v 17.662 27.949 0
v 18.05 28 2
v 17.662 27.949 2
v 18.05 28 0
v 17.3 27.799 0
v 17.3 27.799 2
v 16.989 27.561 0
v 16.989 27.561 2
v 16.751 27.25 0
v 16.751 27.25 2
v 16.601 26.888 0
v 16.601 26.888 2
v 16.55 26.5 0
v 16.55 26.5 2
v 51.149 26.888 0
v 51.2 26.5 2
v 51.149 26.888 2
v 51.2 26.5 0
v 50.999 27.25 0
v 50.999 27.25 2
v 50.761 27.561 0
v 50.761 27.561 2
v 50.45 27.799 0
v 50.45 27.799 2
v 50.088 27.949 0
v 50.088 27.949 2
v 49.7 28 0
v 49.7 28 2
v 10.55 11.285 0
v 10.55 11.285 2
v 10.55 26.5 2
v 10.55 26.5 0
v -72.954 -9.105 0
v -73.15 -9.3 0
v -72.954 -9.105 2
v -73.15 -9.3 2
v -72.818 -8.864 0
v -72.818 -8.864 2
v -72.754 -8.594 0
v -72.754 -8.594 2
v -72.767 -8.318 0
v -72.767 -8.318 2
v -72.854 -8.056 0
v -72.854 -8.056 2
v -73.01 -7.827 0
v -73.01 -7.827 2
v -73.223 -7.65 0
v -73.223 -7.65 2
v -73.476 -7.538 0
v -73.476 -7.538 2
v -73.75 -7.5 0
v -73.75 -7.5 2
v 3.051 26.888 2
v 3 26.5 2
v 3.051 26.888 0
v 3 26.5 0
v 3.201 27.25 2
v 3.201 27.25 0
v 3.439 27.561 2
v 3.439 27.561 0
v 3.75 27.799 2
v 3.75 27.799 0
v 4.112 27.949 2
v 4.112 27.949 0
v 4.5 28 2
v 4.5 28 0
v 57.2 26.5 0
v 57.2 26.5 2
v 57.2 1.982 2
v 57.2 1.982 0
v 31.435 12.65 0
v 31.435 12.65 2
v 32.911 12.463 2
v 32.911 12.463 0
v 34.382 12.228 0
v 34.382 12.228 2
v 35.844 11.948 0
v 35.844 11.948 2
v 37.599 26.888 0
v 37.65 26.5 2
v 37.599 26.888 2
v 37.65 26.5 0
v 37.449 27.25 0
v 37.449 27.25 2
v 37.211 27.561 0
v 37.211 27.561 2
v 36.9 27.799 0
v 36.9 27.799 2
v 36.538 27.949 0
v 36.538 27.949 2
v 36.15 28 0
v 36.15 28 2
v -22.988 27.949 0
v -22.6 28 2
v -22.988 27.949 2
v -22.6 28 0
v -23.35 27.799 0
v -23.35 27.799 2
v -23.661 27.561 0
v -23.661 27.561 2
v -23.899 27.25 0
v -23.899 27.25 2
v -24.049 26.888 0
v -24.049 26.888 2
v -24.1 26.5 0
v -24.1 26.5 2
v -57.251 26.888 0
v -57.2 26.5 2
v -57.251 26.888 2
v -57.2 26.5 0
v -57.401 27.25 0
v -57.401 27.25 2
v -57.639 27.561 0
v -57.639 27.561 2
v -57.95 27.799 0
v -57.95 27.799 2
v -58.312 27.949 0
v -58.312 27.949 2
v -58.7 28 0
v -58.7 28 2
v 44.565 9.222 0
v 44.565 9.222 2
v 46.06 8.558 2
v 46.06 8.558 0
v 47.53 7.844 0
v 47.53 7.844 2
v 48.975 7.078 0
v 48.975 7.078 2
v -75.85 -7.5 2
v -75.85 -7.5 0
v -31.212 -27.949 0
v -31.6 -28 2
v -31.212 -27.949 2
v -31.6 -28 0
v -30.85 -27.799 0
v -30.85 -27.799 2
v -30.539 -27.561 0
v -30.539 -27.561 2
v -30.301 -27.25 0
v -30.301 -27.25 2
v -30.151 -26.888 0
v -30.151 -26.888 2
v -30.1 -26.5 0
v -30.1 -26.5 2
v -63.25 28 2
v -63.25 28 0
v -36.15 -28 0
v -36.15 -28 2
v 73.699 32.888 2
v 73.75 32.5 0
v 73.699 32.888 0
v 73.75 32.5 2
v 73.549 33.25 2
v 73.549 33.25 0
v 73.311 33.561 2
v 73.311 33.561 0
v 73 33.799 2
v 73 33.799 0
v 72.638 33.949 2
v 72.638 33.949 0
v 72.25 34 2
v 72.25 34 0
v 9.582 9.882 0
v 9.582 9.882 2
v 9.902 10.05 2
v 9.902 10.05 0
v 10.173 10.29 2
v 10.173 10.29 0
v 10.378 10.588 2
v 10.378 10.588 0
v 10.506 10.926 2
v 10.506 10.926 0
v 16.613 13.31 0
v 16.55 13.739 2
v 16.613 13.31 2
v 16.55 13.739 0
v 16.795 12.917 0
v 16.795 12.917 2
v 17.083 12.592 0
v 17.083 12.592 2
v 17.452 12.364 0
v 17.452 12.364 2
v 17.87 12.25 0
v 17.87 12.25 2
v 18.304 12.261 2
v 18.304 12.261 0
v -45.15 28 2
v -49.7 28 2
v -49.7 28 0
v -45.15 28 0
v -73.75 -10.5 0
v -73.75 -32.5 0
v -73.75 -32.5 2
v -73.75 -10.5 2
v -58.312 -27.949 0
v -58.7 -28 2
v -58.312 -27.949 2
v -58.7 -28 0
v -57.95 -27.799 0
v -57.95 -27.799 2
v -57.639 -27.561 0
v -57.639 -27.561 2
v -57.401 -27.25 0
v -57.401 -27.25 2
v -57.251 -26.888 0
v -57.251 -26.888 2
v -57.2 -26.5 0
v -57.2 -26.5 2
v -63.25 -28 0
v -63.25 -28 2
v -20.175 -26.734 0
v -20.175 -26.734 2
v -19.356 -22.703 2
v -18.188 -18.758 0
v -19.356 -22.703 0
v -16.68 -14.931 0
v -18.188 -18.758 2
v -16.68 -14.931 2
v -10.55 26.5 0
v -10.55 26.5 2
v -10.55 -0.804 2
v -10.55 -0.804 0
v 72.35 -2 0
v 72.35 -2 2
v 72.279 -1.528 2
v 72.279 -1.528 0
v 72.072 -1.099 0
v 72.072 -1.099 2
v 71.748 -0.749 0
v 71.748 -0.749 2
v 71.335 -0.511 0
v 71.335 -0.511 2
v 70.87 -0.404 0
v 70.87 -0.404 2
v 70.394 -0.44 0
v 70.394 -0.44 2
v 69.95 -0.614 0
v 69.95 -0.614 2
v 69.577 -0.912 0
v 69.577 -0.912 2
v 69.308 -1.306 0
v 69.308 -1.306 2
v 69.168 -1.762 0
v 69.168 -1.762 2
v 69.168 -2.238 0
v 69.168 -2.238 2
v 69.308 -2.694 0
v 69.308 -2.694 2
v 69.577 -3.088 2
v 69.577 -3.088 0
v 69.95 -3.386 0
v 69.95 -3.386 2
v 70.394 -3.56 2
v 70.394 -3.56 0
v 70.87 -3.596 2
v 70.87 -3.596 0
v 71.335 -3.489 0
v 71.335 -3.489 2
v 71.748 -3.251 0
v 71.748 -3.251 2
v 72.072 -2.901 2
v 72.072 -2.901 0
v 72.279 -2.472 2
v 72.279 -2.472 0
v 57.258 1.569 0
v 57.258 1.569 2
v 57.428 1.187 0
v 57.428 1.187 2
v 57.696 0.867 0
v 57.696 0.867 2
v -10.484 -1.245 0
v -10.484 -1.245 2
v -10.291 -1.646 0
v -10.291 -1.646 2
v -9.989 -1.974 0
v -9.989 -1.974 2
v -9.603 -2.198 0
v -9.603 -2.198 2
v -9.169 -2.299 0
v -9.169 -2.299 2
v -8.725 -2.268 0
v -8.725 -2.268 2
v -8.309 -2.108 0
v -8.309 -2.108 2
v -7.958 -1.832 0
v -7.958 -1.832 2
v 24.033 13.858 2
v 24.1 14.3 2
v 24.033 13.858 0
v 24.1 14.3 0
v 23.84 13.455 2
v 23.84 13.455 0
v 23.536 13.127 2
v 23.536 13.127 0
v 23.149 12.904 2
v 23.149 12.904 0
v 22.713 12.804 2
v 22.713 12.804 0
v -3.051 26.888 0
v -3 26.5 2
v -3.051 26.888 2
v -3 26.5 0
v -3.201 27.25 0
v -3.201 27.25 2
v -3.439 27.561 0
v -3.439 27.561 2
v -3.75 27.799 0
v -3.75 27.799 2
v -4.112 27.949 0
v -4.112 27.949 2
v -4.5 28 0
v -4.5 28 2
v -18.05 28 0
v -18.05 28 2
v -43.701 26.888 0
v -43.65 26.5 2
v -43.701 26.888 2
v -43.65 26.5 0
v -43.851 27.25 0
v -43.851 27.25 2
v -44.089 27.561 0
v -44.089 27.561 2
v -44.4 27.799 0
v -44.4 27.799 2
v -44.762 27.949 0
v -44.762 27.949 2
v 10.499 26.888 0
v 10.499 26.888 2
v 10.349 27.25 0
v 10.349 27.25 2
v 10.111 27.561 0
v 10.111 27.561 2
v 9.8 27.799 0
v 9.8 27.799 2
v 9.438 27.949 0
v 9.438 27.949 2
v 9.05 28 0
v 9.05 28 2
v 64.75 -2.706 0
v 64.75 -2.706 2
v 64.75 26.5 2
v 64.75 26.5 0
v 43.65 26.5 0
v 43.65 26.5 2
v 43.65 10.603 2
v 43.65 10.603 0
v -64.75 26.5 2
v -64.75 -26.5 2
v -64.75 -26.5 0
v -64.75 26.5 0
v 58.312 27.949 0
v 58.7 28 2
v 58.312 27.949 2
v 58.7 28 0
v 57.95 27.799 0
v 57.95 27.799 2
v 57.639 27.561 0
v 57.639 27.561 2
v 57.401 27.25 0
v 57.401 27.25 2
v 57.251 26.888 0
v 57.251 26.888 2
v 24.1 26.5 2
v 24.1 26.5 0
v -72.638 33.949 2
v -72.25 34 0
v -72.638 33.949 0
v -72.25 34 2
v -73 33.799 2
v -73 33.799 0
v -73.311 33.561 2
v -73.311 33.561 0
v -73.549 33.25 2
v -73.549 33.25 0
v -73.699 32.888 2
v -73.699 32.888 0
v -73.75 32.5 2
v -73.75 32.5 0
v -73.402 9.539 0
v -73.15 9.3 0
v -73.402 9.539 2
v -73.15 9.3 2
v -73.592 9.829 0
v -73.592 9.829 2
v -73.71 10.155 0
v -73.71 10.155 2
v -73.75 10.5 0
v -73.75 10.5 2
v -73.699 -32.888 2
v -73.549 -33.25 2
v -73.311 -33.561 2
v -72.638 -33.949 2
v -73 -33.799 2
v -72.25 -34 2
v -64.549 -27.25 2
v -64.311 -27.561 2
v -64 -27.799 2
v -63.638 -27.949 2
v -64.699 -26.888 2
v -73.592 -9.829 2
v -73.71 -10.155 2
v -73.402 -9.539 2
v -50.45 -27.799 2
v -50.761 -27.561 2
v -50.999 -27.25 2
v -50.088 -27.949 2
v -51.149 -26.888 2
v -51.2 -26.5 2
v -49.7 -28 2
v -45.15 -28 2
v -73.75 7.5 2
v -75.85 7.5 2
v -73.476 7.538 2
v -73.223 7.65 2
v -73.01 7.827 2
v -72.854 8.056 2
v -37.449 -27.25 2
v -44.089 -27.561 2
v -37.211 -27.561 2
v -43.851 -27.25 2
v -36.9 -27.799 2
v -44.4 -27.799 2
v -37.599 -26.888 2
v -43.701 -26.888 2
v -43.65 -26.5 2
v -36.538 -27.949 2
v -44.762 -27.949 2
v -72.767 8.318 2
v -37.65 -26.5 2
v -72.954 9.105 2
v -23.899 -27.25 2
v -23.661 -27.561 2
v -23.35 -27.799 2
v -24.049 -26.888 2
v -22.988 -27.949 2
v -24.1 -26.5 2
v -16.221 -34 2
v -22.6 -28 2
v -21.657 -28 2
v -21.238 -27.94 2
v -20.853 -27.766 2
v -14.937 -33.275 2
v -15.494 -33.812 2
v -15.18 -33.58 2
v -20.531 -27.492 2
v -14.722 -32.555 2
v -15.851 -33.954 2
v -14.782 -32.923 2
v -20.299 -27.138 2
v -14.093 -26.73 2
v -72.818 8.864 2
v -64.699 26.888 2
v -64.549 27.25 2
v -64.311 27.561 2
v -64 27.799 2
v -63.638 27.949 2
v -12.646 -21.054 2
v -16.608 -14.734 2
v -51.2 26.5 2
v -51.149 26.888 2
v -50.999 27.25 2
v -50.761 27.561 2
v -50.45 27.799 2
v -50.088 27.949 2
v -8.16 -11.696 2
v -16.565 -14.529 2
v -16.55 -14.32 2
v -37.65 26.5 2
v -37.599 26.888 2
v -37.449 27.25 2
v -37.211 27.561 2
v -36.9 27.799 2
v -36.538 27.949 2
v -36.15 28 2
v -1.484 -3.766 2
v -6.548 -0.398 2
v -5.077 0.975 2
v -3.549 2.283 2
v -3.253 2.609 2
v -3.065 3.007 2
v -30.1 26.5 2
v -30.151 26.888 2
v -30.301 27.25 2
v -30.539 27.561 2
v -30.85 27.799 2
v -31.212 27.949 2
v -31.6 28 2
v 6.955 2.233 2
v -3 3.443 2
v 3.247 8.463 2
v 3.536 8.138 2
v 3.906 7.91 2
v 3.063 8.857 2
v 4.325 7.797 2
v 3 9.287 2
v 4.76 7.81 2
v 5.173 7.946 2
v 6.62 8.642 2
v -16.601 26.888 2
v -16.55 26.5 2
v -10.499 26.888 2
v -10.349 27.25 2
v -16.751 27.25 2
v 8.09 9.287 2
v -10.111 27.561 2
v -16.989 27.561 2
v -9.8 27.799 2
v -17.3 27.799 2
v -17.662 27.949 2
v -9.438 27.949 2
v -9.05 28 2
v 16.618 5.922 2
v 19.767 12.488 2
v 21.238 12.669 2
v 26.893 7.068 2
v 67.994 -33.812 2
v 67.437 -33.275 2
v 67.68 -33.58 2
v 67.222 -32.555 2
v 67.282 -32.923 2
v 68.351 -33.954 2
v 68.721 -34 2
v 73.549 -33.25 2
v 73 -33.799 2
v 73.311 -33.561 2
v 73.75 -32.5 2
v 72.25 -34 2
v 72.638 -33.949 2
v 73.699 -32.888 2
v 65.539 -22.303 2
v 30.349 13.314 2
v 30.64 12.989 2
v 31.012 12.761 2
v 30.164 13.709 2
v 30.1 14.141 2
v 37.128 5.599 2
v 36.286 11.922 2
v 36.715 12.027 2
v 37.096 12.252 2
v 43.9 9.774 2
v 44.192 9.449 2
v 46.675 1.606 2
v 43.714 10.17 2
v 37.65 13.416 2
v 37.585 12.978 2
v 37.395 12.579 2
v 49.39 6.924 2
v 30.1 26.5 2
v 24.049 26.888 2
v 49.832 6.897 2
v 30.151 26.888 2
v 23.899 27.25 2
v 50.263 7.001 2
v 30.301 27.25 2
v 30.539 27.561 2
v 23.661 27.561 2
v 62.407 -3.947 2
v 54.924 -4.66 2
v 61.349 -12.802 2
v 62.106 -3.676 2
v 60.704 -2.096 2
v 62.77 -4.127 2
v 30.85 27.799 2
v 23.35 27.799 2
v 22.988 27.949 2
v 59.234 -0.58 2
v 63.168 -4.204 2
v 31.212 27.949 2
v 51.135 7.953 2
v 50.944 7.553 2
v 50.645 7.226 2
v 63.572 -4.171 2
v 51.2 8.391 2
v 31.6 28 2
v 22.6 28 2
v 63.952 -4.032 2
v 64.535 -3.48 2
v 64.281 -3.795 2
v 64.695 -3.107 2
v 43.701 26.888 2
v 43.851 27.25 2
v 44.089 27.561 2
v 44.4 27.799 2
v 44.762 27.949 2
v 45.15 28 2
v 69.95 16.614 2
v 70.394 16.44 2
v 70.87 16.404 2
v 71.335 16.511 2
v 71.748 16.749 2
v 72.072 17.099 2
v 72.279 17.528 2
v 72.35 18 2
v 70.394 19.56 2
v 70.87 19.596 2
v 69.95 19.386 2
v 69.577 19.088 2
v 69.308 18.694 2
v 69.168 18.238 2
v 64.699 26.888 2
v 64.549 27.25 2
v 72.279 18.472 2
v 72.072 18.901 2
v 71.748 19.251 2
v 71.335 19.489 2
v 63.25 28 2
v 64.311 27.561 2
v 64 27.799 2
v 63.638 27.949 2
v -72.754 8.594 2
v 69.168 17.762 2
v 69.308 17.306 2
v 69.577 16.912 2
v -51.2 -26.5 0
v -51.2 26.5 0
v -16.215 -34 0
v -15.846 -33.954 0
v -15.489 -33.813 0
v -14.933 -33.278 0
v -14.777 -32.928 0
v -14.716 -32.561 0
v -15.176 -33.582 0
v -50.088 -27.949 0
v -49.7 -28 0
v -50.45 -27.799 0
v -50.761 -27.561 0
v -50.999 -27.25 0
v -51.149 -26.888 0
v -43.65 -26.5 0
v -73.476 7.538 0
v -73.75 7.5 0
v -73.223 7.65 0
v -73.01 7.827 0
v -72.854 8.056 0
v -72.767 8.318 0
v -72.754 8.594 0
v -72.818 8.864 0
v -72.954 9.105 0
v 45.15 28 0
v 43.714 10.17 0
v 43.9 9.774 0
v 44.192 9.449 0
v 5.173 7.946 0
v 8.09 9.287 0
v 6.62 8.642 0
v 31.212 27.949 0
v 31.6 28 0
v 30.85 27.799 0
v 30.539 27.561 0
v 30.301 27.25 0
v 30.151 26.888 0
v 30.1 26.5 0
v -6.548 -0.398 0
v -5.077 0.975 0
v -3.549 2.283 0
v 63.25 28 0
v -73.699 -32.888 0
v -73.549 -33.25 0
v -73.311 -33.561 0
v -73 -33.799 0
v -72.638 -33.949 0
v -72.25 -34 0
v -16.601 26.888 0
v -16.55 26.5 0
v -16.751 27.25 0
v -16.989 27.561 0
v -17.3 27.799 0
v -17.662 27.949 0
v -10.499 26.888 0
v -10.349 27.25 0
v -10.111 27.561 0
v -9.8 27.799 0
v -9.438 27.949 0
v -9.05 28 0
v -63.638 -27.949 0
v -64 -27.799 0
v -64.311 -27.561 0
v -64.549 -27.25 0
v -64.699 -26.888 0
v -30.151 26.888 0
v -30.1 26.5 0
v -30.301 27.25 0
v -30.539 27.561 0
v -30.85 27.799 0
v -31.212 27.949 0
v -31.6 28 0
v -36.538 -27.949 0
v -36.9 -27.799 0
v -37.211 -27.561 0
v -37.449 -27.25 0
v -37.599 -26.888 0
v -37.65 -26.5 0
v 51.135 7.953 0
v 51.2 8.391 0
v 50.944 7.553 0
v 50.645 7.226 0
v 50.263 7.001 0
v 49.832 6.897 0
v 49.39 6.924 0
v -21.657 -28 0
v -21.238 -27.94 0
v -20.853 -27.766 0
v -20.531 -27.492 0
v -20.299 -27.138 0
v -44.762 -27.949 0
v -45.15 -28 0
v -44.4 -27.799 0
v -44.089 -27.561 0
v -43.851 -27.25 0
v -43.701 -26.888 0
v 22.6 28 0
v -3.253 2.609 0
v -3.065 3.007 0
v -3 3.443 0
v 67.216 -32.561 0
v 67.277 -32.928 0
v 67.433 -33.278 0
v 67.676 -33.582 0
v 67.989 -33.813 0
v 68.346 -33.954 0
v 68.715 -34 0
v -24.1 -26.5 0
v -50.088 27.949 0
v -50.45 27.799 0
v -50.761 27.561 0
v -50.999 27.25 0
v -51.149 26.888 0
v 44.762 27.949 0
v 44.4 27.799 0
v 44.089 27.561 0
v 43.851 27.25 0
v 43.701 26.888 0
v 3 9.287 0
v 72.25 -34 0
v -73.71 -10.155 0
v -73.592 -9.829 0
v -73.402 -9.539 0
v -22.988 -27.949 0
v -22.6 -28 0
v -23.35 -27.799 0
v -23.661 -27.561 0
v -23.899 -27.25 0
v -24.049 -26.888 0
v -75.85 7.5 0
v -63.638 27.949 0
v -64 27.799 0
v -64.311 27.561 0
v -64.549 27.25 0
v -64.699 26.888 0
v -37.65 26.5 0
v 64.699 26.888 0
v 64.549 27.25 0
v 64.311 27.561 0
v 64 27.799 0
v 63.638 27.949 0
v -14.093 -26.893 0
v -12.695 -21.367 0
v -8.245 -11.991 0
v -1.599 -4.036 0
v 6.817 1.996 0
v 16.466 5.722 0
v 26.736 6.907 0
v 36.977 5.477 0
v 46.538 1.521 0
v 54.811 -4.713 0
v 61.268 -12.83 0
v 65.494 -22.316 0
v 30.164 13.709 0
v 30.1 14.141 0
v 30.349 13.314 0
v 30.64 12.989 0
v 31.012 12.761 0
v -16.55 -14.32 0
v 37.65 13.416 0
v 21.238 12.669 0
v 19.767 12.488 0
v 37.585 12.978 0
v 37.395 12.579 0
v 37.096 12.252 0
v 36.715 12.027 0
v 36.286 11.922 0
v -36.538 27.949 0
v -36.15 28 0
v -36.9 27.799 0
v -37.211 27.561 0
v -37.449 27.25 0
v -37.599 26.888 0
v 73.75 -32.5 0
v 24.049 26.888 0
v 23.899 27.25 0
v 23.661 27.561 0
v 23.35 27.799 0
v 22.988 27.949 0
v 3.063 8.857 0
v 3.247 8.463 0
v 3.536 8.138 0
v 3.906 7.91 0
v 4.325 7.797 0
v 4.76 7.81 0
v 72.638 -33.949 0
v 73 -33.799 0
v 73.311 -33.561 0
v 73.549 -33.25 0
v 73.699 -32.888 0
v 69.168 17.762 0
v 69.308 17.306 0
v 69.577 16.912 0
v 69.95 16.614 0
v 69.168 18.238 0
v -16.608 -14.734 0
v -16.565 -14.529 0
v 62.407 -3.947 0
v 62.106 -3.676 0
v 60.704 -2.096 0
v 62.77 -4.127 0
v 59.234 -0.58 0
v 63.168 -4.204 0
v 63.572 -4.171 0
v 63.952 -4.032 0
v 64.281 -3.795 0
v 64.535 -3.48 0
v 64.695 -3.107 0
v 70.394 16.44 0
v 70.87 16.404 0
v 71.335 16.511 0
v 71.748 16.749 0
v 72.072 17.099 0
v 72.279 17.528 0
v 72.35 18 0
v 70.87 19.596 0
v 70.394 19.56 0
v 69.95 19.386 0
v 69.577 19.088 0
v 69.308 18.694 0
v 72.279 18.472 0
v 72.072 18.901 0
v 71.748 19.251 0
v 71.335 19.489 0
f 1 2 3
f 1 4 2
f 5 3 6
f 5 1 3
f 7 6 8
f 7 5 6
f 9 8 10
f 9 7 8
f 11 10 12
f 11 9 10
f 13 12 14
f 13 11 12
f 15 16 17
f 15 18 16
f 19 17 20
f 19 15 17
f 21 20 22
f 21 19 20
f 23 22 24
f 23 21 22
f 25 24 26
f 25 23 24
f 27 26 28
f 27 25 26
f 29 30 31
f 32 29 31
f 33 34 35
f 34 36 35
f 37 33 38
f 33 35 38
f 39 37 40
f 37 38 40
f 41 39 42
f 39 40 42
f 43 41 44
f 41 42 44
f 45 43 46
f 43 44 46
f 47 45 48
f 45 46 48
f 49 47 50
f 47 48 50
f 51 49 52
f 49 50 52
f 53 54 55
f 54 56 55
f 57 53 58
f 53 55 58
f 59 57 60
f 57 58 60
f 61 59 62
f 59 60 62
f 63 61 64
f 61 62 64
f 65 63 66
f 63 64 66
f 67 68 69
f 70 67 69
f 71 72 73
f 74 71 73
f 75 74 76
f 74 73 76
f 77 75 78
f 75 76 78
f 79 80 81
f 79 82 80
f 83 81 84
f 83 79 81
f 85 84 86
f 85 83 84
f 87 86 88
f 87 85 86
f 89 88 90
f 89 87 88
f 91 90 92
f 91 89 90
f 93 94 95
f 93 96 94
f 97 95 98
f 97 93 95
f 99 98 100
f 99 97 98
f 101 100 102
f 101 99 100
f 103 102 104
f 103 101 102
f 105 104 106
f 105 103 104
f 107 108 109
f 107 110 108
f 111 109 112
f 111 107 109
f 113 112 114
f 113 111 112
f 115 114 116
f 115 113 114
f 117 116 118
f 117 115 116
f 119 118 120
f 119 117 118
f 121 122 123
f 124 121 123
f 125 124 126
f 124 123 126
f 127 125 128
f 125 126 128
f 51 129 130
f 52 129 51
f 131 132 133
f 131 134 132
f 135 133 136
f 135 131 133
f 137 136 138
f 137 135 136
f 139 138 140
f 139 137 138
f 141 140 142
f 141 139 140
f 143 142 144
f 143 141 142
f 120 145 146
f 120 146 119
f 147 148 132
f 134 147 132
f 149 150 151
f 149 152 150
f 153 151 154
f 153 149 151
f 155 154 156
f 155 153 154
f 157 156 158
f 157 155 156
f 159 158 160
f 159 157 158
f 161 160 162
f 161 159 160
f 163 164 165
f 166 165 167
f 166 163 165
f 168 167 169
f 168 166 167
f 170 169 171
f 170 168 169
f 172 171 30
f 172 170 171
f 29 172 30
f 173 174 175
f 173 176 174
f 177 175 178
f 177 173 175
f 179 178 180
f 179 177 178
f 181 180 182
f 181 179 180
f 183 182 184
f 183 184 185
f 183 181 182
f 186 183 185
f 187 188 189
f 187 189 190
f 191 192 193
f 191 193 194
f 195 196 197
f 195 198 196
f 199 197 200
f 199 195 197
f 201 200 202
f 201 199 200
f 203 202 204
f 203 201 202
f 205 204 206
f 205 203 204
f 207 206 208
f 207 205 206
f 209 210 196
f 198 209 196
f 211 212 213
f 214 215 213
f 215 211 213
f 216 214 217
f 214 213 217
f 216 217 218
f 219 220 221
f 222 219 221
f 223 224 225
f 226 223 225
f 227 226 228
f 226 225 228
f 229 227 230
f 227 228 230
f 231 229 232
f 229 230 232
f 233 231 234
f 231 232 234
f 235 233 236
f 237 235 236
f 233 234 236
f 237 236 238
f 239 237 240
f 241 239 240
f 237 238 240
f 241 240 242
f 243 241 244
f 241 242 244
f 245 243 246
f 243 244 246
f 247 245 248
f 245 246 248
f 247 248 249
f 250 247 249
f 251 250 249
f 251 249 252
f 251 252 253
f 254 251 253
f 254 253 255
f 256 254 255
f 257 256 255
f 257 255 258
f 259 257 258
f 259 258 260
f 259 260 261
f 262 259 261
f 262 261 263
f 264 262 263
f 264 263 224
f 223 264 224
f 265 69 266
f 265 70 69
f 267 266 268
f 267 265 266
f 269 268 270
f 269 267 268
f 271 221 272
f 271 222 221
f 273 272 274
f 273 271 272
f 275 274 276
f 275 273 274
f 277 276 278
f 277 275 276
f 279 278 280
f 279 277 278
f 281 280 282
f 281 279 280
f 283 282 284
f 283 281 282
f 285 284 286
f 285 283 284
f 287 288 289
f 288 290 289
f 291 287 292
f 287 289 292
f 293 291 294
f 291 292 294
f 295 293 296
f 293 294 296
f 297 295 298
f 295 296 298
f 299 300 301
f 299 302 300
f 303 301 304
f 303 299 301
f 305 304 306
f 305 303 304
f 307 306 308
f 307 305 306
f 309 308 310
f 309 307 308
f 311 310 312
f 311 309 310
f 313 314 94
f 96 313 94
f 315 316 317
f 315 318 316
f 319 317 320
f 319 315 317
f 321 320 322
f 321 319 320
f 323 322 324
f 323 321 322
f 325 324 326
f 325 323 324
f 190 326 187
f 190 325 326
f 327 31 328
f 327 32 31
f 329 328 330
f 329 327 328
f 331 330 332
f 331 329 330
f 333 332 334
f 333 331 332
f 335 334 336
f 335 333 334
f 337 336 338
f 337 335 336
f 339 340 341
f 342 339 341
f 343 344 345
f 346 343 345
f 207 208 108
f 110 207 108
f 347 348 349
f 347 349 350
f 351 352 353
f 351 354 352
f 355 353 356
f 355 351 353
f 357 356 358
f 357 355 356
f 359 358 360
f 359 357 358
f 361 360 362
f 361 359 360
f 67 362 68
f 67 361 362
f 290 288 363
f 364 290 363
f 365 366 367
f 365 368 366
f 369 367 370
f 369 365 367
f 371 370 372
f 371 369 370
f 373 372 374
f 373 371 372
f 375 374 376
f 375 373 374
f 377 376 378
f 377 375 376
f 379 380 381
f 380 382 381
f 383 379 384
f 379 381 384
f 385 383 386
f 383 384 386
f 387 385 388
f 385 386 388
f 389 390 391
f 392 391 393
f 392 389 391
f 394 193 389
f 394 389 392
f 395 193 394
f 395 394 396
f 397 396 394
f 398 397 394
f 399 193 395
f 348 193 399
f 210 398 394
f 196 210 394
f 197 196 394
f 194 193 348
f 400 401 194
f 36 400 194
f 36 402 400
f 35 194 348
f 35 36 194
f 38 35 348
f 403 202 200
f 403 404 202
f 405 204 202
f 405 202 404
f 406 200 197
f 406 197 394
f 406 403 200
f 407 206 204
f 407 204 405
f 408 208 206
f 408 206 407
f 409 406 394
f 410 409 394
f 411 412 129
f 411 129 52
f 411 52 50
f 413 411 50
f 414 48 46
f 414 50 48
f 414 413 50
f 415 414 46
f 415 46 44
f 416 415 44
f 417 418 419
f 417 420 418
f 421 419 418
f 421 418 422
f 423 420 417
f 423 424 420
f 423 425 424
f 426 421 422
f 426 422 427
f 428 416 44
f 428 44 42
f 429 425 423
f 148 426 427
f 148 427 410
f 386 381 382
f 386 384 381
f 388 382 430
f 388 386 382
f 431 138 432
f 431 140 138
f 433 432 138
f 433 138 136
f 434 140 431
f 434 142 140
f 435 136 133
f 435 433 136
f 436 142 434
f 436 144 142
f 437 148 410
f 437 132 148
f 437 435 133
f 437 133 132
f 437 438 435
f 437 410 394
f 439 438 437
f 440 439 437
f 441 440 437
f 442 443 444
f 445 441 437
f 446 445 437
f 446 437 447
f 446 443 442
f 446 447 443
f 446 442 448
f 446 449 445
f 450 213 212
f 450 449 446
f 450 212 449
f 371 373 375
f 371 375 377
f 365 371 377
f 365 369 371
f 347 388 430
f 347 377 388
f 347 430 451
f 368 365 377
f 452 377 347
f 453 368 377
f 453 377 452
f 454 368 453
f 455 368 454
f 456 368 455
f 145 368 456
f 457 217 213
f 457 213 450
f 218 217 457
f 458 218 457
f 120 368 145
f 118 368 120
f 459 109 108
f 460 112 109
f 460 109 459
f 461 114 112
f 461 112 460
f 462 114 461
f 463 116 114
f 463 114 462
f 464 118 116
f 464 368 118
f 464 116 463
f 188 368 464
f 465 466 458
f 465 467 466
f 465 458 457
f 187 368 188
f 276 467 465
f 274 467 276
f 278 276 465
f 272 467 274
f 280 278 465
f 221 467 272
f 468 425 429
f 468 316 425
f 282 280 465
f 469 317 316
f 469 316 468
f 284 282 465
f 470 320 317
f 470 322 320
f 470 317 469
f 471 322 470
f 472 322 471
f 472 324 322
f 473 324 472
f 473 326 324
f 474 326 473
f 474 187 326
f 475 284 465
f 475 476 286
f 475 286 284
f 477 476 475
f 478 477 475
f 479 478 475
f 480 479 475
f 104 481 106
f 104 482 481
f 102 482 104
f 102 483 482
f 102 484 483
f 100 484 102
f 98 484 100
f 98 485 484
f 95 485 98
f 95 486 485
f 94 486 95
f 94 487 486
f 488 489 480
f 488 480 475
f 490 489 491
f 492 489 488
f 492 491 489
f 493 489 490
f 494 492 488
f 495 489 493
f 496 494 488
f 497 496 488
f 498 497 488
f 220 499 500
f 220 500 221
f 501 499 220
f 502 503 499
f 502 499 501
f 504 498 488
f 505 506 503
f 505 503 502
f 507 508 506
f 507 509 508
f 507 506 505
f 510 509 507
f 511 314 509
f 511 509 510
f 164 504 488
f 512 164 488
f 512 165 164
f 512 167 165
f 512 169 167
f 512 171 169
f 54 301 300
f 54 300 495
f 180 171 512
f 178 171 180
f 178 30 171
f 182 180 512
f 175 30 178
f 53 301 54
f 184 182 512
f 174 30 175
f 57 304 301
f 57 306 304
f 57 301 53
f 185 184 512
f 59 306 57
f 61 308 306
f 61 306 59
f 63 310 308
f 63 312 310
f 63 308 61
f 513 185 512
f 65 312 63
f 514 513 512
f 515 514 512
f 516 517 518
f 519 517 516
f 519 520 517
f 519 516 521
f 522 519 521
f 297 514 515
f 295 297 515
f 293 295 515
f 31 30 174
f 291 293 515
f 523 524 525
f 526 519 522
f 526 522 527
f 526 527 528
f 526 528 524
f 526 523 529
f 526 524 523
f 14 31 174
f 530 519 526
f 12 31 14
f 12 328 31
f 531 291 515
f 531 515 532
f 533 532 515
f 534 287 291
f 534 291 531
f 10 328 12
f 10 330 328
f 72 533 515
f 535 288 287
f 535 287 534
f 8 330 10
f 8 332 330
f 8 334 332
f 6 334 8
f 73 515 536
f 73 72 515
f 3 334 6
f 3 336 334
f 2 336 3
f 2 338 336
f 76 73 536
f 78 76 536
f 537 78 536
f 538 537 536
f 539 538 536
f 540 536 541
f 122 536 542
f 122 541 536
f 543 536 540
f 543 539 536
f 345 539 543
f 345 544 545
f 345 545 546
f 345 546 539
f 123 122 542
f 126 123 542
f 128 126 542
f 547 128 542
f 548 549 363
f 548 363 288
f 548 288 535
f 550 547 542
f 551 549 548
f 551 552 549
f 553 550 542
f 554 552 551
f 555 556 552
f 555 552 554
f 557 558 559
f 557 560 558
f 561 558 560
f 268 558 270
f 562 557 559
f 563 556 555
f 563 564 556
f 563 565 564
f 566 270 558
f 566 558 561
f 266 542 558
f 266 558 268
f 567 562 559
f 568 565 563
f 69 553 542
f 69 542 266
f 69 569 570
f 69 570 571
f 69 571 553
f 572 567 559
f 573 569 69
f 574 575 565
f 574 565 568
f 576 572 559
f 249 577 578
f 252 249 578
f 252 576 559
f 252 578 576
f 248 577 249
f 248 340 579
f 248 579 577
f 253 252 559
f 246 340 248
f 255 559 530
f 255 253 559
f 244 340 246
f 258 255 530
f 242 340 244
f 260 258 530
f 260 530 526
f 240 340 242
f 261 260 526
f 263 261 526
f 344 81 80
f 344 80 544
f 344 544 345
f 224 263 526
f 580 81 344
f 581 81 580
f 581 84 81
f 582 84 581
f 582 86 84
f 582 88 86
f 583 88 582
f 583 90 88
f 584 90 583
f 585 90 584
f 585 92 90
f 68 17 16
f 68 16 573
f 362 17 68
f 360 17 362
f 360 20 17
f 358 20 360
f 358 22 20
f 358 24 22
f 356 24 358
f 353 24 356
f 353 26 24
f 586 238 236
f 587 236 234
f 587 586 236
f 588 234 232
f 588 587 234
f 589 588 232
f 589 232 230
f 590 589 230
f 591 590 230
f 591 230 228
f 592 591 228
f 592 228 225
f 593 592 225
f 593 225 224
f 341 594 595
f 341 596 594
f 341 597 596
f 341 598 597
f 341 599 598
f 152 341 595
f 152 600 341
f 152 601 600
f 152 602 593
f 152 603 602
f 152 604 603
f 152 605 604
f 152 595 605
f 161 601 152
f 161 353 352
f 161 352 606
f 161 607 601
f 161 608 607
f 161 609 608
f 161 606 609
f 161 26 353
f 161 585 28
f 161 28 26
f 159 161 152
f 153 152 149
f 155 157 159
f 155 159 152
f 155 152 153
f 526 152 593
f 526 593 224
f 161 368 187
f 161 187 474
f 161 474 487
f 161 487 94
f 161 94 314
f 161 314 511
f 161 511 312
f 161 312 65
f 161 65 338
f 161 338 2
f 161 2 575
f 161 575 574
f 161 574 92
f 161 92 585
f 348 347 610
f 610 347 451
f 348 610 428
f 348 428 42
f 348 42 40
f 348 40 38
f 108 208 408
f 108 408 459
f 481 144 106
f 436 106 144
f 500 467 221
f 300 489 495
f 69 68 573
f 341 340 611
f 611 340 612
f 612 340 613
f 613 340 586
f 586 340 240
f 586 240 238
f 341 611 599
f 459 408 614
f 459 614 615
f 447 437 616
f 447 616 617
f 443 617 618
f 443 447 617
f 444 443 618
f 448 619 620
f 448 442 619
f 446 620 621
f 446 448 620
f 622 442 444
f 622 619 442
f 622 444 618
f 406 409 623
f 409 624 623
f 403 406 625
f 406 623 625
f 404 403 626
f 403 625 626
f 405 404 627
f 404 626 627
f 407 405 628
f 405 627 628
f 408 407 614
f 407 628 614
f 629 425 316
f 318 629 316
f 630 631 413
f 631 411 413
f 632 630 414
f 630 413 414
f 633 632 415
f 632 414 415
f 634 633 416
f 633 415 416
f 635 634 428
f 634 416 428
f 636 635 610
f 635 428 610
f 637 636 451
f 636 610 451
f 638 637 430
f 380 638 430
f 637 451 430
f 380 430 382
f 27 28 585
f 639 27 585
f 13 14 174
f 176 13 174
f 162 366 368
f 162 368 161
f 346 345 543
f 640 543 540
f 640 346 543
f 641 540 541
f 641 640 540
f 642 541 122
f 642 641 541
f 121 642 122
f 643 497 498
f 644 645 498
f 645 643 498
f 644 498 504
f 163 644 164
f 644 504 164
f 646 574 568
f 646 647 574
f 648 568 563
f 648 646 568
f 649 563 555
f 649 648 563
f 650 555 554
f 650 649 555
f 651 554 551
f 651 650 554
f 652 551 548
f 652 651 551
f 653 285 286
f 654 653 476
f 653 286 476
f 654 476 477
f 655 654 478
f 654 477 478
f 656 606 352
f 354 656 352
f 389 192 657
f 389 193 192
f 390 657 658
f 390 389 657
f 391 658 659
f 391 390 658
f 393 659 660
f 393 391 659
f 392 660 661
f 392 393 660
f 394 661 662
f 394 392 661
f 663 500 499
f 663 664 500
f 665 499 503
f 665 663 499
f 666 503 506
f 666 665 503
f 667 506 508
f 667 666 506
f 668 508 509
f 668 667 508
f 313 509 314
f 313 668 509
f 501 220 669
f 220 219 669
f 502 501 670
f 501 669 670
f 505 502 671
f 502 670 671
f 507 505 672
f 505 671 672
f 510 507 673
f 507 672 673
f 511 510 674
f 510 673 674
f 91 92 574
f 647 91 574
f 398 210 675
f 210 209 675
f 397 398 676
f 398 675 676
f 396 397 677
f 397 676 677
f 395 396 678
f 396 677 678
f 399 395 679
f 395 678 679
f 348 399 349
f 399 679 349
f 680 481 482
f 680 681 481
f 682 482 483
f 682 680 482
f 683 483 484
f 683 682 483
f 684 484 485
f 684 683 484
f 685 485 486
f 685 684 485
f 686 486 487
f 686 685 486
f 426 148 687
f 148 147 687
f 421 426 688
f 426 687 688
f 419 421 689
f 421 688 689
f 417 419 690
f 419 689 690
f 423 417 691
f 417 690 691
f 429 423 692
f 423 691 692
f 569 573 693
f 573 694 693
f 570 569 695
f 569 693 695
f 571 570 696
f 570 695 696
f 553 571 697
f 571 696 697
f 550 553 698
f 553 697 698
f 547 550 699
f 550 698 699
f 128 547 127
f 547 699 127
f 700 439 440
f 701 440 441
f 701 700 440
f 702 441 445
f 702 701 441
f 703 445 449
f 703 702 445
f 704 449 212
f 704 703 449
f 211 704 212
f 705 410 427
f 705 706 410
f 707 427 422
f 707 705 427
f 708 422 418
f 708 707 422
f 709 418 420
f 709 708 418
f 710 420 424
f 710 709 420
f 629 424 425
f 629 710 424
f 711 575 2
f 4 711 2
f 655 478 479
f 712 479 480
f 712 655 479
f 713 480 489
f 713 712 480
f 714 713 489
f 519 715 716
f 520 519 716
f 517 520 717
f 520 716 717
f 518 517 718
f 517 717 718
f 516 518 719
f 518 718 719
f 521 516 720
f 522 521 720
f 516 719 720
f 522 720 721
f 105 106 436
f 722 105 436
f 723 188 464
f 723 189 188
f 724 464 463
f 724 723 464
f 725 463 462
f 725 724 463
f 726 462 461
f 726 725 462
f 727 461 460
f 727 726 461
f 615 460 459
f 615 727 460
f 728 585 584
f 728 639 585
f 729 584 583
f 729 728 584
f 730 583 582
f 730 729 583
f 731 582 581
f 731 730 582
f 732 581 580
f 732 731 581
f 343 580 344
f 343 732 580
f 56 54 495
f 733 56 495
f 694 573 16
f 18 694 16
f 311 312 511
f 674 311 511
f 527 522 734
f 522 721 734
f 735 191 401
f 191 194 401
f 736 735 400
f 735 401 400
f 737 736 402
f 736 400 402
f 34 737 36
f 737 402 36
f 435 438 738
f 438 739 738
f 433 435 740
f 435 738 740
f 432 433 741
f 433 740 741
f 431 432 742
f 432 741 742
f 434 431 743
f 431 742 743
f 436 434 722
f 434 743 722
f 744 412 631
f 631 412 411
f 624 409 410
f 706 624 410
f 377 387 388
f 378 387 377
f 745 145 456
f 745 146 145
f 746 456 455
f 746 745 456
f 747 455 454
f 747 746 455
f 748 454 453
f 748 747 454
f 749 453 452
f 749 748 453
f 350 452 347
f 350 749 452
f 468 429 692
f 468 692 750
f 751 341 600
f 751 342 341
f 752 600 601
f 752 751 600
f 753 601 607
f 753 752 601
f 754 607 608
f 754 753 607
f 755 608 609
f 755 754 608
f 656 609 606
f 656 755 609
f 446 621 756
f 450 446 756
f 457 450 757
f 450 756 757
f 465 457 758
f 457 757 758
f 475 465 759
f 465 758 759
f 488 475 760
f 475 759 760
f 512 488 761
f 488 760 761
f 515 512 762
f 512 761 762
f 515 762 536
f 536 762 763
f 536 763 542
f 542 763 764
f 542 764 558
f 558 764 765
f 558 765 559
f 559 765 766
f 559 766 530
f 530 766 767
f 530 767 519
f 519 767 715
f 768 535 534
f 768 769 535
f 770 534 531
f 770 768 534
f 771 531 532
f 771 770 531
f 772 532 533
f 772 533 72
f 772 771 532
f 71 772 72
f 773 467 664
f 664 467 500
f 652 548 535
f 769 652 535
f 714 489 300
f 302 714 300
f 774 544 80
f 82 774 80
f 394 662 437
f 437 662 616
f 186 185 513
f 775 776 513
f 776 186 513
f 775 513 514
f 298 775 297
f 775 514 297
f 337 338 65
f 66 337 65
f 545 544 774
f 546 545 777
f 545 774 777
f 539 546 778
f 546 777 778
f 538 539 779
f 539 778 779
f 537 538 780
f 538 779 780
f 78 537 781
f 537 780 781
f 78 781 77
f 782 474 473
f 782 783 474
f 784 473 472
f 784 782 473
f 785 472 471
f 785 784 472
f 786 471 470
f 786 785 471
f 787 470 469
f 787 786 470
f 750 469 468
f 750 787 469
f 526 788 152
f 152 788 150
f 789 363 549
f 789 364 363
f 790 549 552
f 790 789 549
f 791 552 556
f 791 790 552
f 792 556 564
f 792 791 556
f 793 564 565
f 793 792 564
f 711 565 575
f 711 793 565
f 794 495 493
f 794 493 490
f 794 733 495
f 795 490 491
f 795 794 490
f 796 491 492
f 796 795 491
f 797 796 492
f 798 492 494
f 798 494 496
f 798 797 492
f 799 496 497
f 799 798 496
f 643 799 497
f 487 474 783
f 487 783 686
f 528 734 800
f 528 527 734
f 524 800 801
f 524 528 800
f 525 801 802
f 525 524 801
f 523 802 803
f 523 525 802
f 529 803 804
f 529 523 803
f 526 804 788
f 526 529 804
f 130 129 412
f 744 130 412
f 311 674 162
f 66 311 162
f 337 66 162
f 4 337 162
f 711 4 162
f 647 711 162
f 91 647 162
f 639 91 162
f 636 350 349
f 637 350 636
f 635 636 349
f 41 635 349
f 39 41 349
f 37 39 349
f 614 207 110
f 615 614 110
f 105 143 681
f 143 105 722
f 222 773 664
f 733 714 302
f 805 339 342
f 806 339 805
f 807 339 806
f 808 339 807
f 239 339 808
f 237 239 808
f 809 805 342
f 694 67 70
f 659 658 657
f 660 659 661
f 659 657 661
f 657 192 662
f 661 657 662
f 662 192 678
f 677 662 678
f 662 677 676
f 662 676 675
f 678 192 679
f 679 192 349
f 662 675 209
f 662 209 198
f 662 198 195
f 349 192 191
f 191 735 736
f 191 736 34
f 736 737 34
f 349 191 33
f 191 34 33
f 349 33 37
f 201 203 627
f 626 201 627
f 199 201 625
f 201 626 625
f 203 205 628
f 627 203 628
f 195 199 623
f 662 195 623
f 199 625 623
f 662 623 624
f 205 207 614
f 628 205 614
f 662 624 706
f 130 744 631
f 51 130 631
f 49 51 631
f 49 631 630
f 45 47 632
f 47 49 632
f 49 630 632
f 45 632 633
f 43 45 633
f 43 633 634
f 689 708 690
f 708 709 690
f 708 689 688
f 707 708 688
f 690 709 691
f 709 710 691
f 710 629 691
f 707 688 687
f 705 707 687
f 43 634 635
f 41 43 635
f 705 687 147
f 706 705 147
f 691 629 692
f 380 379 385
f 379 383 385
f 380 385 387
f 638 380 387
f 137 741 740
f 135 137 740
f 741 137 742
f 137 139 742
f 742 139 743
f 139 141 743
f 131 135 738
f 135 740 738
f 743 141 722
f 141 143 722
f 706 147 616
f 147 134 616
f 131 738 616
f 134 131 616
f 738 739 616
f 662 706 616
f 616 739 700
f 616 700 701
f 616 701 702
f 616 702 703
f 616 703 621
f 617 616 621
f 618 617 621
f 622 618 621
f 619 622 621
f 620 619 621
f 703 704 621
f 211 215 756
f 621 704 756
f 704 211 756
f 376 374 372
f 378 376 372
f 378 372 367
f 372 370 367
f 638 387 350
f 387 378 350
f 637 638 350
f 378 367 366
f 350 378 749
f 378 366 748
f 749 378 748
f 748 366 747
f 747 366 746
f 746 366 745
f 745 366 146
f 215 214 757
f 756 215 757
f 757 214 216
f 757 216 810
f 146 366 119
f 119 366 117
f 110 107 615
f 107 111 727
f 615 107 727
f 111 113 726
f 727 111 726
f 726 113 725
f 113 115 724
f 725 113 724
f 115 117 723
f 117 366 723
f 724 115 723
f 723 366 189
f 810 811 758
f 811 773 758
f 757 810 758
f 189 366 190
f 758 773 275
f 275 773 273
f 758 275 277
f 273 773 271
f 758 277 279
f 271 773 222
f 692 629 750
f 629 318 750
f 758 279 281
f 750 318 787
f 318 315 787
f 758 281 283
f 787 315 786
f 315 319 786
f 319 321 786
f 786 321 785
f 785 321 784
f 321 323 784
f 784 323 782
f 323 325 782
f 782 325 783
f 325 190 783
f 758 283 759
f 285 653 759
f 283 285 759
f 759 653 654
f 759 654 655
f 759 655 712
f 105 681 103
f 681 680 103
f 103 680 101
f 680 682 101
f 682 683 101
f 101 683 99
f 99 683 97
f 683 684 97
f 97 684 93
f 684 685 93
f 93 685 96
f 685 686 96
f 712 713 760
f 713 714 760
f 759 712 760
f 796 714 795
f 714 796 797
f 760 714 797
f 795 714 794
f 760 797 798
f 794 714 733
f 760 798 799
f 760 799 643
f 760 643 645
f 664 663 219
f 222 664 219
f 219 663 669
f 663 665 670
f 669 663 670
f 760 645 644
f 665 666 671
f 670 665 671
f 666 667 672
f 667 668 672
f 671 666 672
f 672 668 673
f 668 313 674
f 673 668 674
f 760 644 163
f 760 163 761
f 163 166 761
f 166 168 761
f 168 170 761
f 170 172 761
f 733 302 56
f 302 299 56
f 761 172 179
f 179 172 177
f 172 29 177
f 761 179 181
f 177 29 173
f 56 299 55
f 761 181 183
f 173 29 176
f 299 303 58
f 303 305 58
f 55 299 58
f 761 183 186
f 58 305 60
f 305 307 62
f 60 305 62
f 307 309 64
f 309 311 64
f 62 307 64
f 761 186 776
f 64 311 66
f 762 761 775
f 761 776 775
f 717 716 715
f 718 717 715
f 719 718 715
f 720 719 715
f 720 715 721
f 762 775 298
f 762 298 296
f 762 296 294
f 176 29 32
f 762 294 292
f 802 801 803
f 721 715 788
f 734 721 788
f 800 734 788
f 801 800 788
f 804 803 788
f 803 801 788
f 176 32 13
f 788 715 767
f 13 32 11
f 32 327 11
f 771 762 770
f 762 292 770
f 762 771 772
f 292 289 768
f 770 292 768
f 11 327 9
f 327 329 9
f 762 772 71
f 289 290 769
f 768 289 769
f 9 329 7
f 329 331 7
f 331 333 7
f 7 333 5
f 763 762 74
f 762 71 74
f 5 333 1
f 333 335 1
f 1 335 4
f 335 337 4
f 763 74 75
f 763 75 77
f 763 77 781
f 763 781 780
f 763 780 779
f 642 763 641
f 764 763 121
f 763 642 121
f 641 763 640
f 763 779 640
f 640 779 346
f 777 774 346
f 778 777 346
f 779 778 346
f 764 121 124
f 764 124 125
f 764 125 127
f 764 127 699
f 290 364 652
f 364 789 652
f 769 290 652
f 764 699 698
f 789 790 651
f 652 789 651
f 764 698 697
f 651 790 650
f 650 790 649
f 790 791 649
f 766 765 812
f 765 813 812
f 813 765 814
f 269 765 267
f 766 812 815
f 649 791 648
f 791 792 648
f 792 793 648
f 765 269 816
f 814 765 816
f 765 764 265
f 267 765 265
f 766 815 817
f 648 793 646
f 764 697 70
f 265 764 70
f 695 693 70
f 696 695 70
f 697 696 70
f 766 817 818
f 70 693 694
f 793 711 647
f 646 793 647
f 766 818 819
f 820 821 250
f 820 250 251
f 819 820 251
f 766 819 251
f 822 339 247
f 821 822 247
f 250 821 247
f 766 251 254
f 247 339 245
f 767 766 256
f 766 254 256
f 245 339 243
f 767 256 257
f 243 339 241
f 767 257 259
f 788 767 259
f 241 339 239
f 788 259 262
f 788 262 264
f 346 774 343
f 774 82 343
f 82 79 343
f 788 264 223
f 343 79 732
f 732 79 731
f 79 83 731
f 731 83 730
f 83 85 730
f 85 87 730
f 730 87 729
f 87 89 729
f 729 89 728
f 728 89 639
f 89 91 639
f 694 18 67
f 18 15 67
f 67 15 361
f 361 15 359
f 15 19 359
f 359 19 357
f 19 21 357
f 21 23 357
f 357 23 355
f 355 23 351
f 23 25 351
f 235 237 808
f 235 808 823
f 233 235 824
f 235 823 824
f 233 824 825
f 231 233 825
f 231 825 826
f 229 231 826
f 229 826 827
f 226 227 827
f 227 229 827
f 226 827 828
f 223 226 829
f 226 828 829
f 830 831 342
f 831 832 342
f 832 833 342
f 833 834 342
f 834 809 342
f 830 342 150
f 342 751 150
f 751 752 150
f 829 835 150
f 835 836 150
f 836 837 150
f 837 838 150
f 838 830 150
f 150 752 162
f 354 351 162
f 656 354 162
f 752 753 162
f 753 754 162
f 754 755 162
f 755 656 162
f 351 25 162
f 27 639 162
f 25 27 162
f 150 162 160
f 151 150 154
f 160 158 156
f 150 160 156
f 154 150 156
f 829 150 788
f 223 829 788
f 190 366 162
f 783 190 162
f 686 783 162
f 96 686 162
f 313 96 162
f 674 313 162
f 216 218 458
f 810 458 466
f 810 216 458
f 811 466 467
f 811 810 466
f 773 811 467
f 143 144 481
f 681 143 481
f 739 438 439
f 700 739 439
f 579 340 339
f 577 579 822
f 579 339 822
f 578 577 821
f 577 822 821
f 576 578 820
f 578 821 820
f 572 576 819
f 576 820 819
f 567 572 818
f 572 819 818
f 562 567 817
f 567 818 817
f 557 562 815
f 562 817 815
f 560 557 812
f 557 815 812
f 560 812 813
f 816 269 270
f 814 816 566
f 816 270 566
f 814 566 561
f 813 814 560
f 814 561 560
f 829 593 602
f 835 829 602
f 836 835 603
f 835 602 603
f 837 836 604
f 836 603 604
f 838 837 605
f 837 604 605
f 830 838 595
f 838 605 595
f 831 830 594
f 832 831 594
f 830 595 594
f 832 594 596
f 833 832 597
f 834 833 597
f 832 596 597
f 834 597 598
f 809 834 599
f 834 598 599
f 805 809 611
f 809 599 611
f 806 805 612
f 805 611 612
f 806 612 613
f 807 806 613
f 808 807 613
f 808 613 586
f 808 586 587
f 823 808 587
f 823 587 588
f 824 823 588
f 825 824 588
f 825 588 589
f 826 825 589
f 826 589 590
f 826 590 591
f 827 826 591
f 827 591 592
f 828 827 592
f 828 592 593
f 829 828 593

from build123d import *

# Parameters (mm, degrees)
SKETCH_1_W          = 147.5
SKETCH_1_H          = 68
EXTRUDE_1_DEPTH     = 2
SKETCH_2_W          = 2.1
SKETCH_2_H          = 15
EXTRUDE_2_DEPTH     = 2
SKETCH_3_R          = 1
CUT_EXTRUDE_1_DEPTH = 10
SKETCH_4_R          = 41
CUT_EXTRUDE_2_DEPTH = 86.383343966
SKETCH_5_W          = 7.55
SKETCH_5_H          = 56
CUT_EXTRUDE_3_DEPTH = 10
FILLET_1_R          = 1.5
SKETCH_6_R          = 1.6
CUT_EXTRUDE_4_DEPTH = 84.145790768


with BuildPart() as part:
    # 草图1 → 凸台-拉伸1 (new body)
    with BuildSketch(Plane.XY):
        Rectangle(SKETCH_1_W, SKETCH_1_H)
    extrude(amount=EXTRUDE_1_DEPTH)

    # 草图2 → 凸台-拉伸2 (add)
    with BuildSketch(Plane.XY.offset(2)):
        with Locations((-74.8, 0)):
            Rectangle(SKETCH_2_W, SKETCH_2_H)
    extrude(amount=-EXTRUDE_2_DEPTH)

    # 草图3 → 切除-拉伸1 (cut)
    with BuildSketch(Plane.XY.offset(2)):
        with Locations((-73.75, 8.5)):
            Circle(SKETCH_3_R)
        with Locations((-73.75, -8.5)):
            Circle(SKETCH_3_R)
    extrude(amount=-CUT_EXTRUDE_1_DEPTH, mode=Mode.SUBTRACT)

    # 草图4 → 切除-拉伸2 (cut, through all)
    with BuildSketch(Plane(origin=(0, -1.238963971, -15.184537967), x_dir=(-1, 0, 0), z_dir=(0, -0.08132352941176414, -0.9966877563028524))):
        with Locations((-26.25, -34.112616286)):
            Circle(SKETCH_4_R)
    extrude(amount=-CUT_EXTRUDE_2_DEPTH, mode=Mode.SUBTRACT)

    # 草图5 → 切除-拉伸3 (cut)
    with BuildSketch(Plane.XY.offset(2)):
        with BuildLine():
            ThreePointArc((57.2, 1.30806357), (61.228827839, -2.670411735), (64.75, -7.104491812))
            Line((64.75, -7.104491812), (64.75, 28))
            Line((64.75, 28), (57.2, 28))
            Line((57.2, 28), (57.2, 1.30806357))
        make_face()
        with BuildLine():
            ThreePointArc((43.65, 9.597715314), (47.51140105, 7.853227963), (51.2, 5.768068026))
            Line((51.2, 5.768068026), (51.2, 28))
            Line((51.2, 28), (43.65, 28))
            Line((43.65, 28), (43.65, 9.597715314))
        make_face()
        with BuildLine():
            ThreePointArc((30.1, 12.779255237), (33.900390726, 12.310383571), (37.65, 11.533697921))
            Line((37.65, 11.533697921), (37.65, 28))
            Line((37.65, 28), (30.1, 28))
            Line((30.1, 28), (30.1, 12.779255237))
        make_face()
        with BuildLine():
            ThreePointArc((16.55, 11.925357473), (20.3054817, 12.559762544), (24.1, 12.888005534))
            Line((24.1, 12.888005534), (24.1, 28))
            Line((24.1, 28), (16.55, 28))
            Line((16.55, 28), (16.55, 11.925357473))
        make_face()
        with BuildLine():
            Line((3, 28), (3, 6.783718345))
            ThreePointArc((3, 6.783718345), (6.698589297, 8.677613253), (10.55, 10.23743257))
            Line((10.55, 10.23743257), (10.55, 28))
            Line((10.55, 28), (3, 28))
        make_face()
        with BuildLine():
            Line((-10.55, 28), (-10.55, -4.826514156))
            ThreePointArc((-10.55, -4.826514156), (-6.990214832, -0.834971606), (-3, 2.726301758))
            Line((-3, 2.726301758), (-3, 28))
            Line((-3, 28), (-10.55, 28))
        make_face()
        with BuildLine():
            Line((-24.1, -28), (-20.357323082, -28))
            ThreePointArc((-20.357323082, -28), (-18.949835838, -21.179670039), (-16.55, -14.642185119))
            Line((-16.55, -14.642185119), (-16.55, 28))
            Line((-16.55, 28), (-24.1, 28))
            Line((-24.1, 28), (-24.1, -28))
        make_face()
        with Locations((-33.875, 0)):
            Rectangle(SKETCH_5_W, SKETCH_5_H)
        with Locations((-47.425, 0)):
            Rectangle(SKETCH_5_W, SKETCH_5_H)
        with Locations((-60.975, 0)):
            Rectangle(SKETCH_5_W, SKETCH_5_H)
    extrude(amount=-CUT_EXTRUDE_3_DEPTH, mode=Mode.SUBTRACT)

    # 圆角1
    fillet_1_edges = [part.edges().sort_by_distance(p)[0] for p in [
        (-14.749747441, -34, 0.999999977),
        (67.249747441, -34, 0.999999977),
        (-73.75, -34, 1),
        (-73.75, -9.5, 1),
        (-73.75, 9.5, 1),
        (-73.75, 34, 1),
        (73.75, 34, 1),
        (73.75, -34, 1),
        (57.2, 1.30806357, 1),
        (57.2, 28, 1),
        (64.75, 28, 1),
        (30.1, 12.779255237, 1),
        (30.1, 28, 1),
        (37.65, 28, 1),
        (37.65, 11.533697921, 1),
        (3, 6.783718345, 1),
        (3, 28, 1),
        (10.55, 28, 1),
        (10.55, 10.23743257, 1),
        (-20.357323082, -28, 1),
        (-24.1, -28, 1),
        (-24.1, 28, 1),
        (-16.55, 28, 1),
        (-16.55, -14.642185119, 1),
        (-51.2, -28, 1),
        (-51.2, 28, 1),
        (-43.65, 28, 1),
        (-43.65, -28, 1),
        (-64.75, 28, 1),
        (-57.2, 28, 1),
        (-57.2, -28, 1),
        (-64.75, -28, 1),
        (-37.65, -28, 1),
        (-37.65, 28, 1),
        (-30.1, 28, 1),
        (-30.1, -28, 1),
        (-10.55, -4.826514156, 1),
        (-10.55, 28, 1),
        (-3, 28, 1),
        (-3, 2.726301758, 1),
        (16.55, 11.925357473, 1),
        (16.55, 28, 1),
        (24.1, 28, 1),
        (24.1, 12.888005534, 1),
        (43.65, 9.597715314, 1),
        (43.65, 28, 1),
        (51.2, 28, 1),
        (51.2, 5.768068026, 1),
        (64.75, -7.104491812, 1),
    ]]
    fillet(fillet_1_edges, radius=FILLET_1_R)

    # 草图6 → 切除-拉伸4 (cut, through all)
    with BuildSketch(Plane.XY.offset(2)):
        with Locations((70.75, -2)):
            Circle(SKETCH_6_R)
        with Locations((70.75, 18)):
            Circle(SKETCH_6_R)
    extrude(amount=-CUT_EXTRUDE_4_DEPTH, mode=Mode.SUBTRACT)


solid = part.part
